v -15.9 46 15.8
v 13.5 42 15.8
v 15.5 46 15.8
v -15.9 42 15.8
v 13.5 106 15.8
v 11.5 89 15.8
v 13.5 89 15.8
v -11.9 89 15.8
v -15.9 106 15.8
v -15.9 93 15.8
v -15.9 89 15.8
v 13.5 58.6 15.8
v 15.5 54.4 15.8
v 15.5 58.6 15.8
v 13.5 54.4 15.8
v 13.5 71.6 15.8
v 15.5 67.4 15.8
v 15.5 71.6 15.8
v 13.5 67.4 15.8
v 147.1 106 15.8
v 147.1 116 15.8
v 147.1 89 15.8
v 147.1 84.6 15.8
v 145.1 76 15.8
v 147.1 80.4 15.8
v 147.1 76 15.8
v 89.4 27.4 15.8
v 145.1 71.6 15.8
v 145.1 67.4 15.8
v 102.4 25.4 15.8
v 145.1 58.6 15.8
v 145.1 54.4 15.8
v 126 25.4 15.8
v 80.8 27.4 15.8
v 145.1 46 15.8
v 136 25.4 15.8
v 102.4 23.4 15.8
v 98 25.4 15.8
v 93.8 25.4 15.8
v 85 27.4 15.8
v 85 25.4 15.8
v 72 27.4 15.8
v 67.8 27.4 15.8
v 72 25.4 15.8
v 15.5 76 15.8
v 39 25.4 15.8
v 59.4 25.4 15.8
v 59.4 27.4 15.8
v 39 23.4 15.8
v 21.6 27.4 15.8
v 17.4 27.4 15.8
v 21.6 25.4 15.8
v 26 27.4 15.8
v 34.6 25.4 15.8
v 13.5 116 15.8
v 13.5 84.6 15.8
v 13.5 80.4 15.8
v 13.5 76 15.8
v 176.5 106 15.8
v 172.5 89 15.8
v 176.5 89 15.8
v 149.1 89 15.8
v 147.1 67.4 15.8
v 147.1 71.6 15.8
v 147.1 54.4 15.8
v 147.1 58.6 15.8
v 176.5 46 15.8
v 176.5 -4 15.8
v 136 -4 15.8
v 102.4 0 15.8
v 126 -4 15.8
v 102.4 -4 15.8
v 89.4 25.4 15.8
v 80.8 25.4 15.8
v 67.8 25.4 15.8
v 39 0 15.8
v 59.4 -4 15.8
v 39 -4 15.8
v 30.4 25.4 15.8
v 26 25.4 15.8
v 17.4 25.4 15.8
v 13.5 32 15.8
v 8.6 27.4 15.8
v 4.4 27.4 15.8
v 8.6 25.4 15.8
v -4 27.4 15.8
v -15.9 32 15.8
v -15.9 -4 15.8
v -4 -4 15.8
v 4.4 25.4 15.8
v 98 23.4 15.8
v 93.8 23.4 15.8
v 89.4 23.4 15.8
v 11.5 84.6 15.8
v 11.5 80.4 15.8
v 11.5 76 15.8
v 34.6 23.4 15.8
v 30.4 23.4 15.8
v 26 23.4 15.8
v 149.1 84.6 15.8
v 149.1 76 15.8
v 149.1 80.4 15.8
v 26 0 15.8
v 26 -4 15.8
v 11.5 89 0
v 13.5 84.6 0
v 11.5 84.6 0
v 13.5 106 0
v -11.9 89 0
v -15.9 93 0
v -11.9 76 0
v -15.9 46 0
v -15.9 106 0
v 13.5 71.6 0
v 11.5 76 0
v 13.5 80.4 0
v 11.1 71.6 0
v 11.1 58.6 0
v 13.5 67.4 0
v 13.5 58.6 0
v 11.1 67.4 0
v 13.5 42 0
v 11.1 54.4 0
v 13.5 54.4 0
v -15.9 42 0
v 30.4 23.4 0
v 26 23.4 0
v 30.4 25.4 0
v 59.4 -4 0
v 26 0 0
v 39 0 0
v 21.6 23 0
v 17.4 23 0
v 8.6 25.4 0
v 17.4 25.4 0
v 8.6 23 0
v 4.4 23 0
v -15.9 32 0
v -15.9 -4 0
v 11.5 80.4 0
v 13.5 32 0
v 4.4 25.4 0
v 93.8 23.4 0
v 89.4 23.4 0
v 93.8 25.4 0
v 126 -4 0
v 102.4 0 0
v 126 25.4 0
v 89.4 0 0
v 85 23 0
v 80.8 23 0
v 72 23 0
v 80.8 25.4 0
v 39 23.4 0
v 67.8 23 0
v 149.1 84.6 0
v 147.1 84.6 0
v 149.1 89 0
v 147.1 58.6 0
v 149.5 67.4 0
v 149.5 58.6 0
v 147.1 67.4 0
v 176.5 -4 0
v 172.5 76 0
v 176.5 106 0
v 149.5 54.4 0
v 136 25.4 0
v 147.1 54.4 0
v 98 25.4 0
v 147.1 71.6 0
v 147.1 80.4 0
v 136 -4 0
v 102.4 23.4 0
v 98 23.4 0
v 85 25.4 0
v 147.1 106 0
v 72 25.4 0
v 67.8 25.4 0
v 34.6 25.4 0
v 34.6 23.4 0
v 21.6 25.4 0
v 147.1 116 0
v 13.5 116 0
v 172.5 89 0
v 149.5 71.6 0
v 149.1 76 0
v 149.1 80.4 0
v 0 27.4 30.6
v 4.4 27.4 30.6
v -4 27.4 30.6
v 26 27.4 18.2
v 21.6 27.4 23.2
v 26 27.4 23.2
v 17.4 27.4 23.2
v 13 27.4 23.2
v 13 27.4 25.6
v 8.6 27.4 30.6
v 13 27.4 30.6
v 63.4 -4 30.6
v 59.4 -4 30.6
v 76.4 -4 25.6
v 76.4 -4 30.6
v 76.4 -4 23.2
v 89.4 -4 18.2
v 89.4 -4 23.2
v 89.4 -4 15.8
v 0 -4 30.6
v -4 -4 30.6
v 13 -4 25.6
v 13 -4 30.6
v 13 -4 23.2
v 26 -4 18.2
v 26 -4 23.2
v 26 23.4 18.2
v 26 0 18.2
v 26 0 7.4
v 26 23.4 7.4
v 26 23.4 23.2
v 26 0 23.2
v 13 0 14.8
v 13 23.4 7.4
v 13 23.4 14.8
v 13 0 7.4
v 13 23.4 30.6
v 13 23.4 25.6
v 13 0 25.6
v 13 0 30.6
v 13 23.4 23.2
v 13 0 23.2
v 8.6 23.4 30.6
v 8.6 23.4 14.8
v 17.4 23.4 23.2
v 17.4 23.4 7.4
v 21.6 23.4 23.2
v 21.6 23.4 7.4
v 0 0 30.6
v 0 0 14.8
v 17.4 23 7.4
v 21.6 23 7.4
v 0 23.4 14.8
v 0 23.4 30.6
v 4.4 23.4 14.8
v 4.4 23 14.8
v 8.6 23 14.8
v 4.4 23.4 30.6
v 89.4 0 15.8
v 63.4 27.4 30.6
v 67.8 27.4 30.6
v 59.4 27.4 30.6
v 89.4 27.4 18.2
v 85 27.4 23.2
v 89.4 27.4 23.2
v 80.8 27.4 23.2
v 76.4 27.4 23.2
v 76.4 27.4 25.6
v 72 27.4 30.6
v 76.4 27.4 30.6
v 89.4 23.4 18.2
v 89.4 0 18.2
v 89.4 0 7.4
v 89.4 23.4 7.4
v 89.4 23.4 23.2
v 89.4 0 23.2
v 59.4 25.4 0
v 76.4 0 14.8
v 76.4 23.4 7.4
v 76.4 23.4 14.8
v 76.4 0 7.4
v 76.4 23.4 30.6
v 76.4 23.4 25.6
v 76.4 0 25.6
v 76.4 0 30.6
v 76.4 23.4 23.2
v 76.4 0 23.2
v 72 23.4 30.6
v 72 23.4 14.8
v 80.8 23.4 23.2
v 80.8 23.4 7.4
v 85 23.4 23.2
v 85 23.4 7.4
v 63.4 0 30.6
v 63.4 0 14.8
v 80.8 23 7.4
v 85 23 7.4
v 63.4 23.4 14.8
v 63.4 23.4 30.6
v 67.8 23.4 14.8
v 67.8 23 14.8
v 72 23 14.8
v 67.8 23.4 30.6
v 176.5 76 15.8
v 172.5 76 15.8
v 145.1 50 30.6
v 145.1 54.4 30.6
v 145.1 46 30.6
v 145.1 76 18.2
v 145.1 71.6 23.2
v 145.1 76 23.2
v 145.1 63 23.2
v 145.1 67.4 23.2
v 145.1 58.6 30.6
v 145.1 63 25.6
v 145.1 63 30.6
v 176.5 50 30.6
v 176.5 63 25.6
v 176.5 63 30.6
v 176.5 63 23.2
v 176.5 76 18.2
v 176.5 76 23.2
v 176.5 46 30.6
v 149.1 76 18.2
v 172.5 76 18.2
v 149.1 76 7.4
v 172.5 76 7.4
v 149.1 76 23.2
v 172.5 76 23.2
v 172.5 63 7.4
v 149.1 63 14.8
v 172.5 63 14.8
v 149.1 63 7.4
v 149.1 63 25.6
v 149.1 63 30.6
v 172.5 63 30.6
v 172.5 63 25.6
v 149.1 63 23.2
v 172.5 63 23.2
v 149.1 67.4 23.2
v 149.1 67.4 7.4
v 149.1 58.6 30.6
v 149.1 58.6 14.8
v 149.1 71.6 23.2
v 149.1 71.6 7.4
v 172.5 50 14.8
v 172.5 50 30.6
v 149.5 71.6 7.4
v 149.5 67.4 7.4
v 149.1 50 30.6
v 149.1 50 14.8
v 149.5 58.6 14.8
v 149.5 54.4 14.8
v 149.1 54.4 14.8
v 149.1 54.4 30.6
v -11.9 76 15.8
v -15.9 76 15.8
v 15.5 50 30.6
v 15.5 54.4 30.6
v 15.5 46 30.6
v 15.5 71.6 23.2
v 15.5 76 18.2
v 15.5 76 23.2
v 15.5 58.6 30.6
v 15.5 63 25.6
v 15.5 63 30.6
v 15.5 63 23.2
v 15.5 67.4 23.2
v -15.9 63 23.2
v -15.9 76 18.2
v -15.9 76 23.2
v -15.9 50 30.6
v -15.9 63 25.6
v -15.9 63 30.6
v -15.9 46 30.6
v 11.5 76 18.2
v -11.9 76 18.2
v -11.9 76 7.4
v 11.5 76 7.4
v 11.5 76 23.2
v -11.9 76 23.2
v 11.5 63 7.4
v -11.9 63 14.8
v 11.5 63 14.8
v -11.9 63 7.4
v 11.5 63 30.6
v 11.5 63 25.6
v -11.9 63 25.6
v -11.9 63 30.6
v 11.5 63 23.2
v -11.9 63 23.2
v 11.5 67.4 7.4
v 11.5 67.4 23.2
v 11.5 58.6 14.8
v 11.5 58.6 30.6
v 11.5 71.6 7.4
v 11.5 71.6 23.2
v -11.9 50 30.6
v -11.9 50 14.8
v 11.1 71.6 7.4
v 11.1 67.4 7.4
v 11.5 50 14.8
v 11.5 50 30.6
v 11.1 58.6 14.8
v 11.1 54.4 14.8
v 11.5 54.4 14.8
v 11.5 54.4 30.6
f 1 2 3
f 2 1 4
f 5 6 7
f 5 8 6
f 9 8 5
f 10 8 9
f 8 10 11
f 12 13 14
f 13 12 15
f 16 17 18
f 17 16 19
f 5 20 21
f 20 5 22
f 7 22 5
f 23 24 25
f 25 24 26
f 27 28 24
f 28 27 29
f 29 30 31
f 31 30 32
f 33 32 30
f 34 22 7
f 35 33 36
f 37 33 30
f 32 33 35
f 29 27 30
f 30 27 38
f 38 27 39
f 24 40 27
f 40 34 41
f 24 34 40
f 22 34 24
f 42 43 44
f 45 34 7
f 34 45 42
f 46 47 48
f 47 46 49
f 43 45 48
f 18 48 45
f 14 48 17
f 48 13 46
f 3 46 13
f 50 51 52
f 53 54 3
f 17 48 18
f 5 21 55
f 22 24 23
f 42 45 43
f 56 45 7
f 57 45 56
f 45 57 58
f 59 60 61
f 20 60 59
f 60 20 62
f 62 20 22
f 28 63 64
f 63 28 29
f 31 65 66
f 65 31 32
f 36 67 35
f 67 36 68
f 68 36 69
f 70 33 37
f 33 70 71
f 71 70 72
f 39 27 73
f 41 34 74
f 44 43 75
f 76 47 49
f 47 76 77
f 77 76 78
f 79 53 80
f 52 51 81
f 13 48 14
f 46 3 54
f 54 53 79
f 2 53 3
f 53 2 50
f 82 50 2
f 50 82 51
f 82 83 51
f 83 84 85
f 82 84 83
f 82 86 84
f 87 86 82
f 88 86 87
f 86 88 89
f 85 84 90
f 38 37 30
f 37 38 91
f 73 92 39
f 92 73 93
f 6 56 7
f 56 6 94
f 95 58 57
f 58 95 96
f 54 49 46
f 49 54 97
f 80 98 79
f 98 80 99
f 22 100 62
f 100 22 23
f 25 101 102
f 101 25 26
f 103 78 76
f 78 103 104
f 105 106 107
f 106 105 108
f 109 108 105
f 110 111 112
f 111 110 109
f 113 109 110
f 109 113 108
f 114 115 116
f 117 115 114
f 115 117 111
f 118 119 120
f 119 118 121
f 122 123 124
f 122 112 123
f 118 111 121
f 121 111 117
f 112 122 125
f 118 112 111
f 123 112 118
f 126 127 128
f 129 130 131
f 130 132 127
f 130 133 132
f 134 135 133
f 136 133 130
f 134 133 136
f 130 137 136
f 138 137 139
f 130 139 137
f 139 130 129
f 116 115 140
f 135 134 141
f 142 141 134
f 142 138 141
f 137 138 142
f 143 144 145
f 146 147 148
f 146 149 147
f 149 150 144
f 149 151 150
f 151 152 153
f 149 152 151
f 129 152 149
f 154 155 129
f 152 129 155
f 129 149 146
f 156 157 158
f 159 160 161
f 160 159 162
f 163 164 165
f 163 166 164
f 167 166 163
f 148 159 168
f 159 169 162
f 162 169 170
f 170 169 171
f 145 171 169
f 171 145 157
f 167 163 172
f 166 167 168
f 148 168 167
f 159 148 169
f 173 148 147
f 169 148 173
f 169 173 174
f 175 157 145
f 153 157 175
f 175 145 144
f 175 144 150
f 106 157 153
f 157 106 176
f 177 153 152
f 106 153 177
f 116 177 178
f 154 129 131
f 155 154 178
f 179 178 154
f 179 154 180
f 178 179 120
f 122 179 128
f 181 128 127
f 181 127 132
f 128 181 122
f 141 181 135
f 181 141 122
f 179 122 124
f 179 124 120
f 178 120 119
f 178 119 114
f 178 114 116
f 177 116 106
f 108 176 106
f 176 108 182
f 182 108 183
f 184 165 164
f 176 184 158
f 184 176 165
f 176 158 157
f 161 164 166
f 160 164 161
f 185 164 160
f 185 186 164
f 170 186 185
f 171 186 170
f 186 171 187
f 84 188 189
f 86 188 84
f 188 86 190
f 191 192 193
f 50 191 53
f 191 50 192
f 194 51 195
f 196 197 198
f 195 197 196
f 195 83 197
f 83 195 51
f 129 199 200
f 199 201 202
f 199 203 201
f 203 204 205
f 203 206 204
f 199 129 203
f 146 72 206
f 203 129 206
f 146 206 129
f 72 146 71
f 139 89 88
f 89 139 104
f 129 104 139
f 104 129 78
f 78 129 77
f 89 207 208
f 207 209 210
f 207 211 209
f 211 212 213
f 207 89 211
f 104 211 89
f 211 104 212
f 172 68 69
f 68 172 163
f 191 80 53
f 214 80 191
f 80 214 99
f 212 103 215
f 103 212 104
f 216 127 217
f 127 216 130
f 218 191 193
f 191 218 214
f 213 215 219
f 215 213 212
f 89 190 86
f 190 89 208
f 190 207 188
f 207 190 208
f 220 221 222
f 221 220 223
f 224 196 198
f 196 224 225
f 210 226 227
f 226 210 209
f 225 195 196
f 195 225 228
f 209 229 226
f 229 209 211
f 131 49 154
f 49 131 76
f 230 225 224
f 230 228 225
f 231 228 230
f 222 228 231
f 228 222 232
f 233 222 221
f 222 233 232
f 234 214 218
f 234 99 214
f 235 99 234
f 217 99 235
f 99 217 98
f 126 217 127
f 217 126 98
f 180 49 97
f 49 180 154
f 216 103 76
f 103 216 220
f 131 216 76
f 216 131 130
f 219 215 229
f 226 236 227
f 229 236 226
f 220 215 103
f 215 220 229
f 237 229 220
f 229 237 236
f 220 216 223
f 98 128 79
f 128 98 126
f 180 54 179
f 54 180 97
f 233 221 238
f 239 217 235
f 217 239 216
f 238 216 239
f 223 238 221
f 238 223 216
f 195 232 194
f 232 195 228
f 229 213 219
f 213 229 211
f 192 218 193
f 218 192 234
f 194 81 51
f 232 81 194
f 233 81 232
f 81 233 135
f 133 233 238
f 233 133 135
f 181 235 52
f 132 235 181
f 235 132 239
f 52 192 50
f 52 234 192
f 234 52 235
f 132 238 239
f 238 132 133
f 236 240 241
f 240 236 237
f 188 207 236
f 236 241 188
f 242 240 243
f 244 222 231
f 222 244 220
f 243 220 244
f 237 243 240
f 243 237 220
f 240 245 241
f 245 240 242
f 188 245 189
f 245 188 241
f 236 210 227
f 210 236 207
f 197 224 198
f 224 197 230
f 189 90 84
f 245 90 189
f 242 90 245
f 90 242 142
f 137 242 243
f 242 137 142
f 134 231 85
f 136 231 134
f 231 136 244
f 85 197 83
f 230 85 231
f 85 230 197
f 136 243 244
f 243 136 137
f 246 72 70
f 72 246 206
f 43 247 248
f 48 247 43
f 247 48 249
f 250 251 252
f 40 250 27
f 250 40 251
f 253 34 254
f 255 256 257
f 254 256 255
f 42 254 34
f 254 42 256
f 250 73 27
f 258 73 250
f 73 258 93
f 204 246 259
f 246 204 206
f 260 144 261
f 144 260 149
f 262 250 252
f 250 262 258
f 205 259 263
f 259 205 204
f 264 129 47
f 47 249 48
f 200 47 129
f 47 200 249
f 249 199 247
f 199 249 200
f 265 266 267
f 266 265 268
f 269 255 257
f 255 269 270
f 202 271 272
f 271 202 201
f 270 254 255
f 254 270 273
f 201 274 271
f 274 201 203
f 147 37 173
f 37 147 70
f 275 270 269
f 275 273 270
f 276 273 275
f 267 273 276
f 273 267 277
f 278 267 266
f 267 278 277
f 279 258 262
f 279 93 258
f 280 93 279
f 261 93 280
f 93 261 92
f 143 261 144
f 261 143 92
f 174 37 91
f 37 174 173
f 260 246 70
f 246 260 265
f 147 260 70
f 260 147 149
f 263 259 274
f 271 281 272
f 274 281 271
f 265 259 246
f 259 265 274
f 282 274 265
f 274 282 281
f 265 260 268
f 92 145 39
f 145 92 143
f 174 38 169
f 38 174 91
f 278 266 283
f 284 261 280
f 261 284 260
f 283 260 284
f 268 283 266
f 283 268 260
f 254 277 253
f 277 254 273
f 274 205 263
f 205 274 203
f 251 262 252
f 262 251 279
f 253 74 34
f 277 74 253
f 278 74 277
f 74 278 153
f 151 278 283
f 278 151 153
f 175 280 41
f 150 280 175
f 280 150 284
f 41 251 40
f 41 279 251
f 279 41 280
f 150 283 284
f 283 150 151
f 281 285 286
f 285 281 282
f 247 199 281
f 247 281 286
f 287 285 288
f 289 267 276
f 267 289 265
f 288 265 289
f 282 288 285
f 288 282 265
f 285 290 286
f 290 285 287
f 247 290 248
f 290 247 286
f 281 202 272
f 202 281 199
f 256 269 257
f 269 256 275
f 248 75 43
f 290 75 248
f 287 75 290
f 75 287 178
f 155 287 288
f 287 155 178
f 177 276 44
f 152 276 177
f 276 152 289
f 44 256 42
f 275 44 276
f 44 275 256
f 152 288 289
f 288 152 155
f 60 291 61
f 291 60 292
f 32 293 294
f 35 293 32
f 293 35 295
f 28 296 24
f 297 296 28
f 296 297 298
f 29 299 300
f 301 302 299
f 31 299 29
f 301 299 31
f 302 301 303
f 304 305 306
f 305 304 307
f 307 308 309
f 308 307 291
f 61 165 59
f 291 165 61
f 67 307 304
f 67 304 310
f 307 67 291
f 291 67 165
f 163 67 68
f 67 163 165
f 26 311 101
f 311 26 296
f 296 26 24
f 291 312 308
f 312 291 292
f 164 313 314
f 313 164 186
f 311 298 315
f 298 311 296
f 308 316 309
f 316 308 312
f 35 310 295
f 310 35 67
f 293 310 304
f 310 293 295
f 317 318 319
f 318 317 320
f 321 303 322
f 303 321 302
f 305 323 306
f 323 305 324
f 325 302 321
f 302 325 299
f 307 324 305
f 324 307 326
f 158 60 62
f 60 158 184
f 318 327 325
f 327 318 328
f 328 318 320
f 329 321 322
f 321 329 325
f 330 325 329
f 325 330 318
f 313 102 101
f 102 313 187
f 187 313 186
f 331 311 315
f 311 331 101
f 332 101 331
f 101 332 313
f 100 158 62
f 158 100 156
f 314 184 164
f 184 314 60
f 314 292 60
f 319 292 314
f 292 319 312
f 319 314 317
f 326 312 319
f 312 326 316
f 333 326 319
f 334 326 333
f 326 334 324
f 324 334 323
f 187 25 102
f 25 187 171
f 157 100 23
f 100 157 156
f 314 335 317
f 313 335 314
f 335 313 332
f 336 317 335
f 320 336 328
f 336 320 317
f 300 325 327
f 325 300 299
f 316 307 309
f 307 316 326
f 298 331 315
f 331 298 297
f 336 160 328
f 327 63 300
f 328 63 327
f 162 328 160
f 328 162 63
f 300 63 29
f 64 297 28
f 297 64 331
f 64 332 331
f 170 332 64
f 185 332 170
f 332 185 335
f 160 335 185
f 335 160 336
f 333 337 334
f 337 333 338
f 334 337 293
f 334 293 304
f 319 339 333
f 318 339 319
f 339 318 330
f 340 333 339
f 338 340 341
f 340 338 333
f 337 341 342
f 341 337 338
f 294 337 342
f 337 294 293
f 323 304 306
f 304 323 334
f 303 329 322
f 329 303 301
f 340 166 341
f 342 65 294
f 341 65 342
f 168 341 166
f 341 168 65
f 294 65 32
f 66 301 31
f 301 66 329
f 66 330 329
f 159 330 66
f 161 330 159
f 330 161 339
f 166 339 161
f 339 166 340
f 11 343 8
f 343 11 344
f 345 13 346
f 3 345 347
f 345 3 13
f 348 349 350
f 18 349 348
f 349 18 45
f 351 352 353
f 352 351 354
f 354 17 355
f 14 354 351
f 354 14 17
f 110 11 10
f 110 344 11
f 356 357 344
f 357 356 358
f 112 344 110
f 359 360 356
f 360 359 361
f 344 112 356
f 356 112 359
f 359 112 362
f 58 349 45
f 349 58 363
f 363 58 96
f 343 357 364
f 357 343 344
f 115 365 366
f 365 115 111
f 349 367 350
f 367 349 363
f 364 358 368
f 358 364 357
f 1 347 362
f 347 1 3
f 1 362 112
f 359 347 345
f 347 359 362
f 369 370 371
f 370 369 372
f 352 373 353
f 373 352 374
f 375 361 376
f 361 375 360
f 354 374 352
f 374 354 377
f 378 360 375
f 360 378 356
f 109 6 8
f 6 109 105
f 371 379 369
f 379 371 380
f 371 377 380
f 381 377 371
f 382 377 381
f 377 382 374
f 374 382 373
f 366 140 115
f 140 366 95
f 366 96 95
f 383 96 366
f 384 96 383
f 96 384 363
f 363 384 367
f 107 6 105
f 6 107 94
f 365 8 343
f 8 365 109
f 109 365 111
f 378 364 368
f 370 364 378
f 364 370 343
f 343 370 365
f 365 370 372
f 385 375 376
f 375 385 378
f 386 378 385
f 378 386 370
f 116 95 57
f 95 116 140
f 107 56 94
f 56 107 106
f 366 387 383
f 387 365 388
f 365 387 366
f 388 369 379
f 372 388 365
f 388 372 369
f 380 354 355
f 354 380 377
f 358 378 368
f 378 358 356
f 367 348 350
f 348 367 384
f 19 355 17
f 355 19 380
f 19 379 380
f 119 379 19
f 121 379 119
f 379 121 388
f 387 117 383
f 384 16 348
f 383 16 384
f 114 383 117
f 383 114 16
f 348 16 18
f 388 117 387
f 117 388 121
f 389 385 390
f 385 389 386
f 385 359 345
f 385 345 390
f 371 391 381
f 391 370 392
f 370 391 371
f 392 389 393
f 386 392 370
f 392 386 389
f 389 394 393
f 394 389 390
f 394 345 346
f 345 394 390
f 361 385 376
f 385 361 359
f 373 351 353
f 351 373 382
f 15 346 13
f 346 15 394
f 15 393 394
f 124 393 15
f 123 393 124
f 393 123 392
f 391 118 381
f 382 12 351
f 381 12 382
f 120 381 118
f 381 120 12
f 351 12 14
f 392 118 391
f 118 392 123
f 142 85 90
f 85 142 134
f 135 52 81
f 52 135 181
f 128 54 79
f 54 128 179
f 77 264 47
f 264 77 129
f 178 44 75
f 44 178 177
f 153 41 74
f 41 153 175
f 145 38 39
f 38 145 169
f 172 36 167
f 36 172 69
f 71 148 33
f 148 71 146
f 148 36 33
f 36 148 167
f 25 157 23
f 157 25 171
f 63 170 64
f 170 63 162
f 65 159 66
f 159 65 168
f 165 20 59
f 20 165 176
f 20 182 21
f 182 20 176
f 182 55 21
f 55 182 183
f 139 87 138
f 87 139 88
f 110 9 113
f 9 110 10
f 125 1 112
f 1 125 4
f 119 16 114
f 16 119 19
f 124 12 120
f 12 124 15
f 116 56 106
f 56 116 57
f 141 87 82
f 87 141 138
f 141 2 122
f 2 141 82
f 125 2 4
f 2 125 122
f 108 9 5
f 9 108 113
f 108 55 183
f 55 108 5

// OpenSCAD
// file: line.scad
//cube([100,100,15.8]);

servoW=12.6+0.4;
servoH=23.0+0.4;
    waku=4;

module servo(){
    cube([12.6+0.4,23.0+0.4,26.7]);
    translate([0,(23.0-32.4)/2,15.8])
    cube([12.6+0.4,32.4,2.4]);
    translate([(13-4.2)/2,23,-100])
    cube([4.2,5,18+100]);
}

module servo3_0(){
translate([servoW*3,0,0])
scale([-1,1,1])
    for(i = [0:2]){
        translate([i*13,0,(2.4+5)*i]){
            servo();
        }
    }
}

module servo3(){
translate([servoW*3,0,0])
scale([-1,1,1])
difference(){
union(){
    translate([-waku,-waku,0])
    cube([waku,waku*2+servoH,15.8]);
    translate([0,-waku,0]){
    for(i = [0:2]){
        translate([i*13,0,0]){
            cube([waku+servoW,waku*2+servoH,15.8+(2.4+5)*i]);
        }
    }
    }
}


union(){
    for(i = [0:2]){
        translate([i*13,0,(2.4+5)*i]){
            servo();
        }
    }
    
}
}
}

module servo3_rect(l=servoW*3+waku*2){
    translate([-waku,-waku,0])
    cube([l,servoH+waku+2,15.8]);

}


module hikkake(l=servoW*4,d=10,fixPos=true,haba=0.8,thin=2){
    x=0;
    if(fixPos){
        x=-waku;
    }
    for(i=[1:4]){
        translate([0,-d,(2.4+5)*i+15.8+2.4-thin])
            cube([l,d,thin]);  
        translate([0,-d,(2.4+5)*i+15.8+2.4+haba])
            cube([l,d,thin]);  
    }

}

//servo3();
//servo3_0();
//servo();
//hikkake();
//

//for(i=[0:4]){
//translate([-waku,waku+servoH,(2.4+5)*i+15.8+2.4])
//cube([servoW*4,10,2]);
//}
//translate([-waku,waku+servoH,(2.4+5)+15.8+2.4])
//cube([servoW*2+waku,10,2]);
//translate([-waku,waku+servoH,(2.4+5)*2+15.8+2.4])
//cube([servoW+waku,10,2]);
//
//translate([100,0,0])
//servo4_rect();
//
//translate([0,50,0])
//servo4_rect();
// main file
include<line.scad>


//bottom
servo3();
translate([63.4,0,0])
servo3();

translate([172.5,50,0])
rotate([0,0,90])
servo3();

translate([-11.9,50,0])
rotate([0,0,-90])
scale([-1,1,1])
servo3();

difference(){
    translate([-waku-11.9,-waku,0])
    cube([184.4+waku*2,120,15.8]);
    
    union(){
        servo3_rect();
        translate([63.4,0,0])
        servo3_rect();
        
        translate([130,0,0])
        servo3_rect(l=10);

        translate([172.5,50,0])
        rotate([0,0,90])
        servo3_rect();

        translate([172.5,110,0])
        rotate([0,0,90])
        servo3_rect(l=10);

        translate([-11.9,50,0])
        rotate([0,0,-90])
        scale([-1,1,1])
        servo3_rect();
        
        translate([-11.9,40-waku,0])
        rotate([0,0,-90])
        scale([-1,1,1])
        servo3_rect(l=10);
        
        translate([-11.9,110,0])
        rotate([0,0,-90])
        scale([-1,1,1])
        servo3_rect(l=10);
        
    }
}

//translate([0,110-waku,0])
//cube([1,1,300]);
